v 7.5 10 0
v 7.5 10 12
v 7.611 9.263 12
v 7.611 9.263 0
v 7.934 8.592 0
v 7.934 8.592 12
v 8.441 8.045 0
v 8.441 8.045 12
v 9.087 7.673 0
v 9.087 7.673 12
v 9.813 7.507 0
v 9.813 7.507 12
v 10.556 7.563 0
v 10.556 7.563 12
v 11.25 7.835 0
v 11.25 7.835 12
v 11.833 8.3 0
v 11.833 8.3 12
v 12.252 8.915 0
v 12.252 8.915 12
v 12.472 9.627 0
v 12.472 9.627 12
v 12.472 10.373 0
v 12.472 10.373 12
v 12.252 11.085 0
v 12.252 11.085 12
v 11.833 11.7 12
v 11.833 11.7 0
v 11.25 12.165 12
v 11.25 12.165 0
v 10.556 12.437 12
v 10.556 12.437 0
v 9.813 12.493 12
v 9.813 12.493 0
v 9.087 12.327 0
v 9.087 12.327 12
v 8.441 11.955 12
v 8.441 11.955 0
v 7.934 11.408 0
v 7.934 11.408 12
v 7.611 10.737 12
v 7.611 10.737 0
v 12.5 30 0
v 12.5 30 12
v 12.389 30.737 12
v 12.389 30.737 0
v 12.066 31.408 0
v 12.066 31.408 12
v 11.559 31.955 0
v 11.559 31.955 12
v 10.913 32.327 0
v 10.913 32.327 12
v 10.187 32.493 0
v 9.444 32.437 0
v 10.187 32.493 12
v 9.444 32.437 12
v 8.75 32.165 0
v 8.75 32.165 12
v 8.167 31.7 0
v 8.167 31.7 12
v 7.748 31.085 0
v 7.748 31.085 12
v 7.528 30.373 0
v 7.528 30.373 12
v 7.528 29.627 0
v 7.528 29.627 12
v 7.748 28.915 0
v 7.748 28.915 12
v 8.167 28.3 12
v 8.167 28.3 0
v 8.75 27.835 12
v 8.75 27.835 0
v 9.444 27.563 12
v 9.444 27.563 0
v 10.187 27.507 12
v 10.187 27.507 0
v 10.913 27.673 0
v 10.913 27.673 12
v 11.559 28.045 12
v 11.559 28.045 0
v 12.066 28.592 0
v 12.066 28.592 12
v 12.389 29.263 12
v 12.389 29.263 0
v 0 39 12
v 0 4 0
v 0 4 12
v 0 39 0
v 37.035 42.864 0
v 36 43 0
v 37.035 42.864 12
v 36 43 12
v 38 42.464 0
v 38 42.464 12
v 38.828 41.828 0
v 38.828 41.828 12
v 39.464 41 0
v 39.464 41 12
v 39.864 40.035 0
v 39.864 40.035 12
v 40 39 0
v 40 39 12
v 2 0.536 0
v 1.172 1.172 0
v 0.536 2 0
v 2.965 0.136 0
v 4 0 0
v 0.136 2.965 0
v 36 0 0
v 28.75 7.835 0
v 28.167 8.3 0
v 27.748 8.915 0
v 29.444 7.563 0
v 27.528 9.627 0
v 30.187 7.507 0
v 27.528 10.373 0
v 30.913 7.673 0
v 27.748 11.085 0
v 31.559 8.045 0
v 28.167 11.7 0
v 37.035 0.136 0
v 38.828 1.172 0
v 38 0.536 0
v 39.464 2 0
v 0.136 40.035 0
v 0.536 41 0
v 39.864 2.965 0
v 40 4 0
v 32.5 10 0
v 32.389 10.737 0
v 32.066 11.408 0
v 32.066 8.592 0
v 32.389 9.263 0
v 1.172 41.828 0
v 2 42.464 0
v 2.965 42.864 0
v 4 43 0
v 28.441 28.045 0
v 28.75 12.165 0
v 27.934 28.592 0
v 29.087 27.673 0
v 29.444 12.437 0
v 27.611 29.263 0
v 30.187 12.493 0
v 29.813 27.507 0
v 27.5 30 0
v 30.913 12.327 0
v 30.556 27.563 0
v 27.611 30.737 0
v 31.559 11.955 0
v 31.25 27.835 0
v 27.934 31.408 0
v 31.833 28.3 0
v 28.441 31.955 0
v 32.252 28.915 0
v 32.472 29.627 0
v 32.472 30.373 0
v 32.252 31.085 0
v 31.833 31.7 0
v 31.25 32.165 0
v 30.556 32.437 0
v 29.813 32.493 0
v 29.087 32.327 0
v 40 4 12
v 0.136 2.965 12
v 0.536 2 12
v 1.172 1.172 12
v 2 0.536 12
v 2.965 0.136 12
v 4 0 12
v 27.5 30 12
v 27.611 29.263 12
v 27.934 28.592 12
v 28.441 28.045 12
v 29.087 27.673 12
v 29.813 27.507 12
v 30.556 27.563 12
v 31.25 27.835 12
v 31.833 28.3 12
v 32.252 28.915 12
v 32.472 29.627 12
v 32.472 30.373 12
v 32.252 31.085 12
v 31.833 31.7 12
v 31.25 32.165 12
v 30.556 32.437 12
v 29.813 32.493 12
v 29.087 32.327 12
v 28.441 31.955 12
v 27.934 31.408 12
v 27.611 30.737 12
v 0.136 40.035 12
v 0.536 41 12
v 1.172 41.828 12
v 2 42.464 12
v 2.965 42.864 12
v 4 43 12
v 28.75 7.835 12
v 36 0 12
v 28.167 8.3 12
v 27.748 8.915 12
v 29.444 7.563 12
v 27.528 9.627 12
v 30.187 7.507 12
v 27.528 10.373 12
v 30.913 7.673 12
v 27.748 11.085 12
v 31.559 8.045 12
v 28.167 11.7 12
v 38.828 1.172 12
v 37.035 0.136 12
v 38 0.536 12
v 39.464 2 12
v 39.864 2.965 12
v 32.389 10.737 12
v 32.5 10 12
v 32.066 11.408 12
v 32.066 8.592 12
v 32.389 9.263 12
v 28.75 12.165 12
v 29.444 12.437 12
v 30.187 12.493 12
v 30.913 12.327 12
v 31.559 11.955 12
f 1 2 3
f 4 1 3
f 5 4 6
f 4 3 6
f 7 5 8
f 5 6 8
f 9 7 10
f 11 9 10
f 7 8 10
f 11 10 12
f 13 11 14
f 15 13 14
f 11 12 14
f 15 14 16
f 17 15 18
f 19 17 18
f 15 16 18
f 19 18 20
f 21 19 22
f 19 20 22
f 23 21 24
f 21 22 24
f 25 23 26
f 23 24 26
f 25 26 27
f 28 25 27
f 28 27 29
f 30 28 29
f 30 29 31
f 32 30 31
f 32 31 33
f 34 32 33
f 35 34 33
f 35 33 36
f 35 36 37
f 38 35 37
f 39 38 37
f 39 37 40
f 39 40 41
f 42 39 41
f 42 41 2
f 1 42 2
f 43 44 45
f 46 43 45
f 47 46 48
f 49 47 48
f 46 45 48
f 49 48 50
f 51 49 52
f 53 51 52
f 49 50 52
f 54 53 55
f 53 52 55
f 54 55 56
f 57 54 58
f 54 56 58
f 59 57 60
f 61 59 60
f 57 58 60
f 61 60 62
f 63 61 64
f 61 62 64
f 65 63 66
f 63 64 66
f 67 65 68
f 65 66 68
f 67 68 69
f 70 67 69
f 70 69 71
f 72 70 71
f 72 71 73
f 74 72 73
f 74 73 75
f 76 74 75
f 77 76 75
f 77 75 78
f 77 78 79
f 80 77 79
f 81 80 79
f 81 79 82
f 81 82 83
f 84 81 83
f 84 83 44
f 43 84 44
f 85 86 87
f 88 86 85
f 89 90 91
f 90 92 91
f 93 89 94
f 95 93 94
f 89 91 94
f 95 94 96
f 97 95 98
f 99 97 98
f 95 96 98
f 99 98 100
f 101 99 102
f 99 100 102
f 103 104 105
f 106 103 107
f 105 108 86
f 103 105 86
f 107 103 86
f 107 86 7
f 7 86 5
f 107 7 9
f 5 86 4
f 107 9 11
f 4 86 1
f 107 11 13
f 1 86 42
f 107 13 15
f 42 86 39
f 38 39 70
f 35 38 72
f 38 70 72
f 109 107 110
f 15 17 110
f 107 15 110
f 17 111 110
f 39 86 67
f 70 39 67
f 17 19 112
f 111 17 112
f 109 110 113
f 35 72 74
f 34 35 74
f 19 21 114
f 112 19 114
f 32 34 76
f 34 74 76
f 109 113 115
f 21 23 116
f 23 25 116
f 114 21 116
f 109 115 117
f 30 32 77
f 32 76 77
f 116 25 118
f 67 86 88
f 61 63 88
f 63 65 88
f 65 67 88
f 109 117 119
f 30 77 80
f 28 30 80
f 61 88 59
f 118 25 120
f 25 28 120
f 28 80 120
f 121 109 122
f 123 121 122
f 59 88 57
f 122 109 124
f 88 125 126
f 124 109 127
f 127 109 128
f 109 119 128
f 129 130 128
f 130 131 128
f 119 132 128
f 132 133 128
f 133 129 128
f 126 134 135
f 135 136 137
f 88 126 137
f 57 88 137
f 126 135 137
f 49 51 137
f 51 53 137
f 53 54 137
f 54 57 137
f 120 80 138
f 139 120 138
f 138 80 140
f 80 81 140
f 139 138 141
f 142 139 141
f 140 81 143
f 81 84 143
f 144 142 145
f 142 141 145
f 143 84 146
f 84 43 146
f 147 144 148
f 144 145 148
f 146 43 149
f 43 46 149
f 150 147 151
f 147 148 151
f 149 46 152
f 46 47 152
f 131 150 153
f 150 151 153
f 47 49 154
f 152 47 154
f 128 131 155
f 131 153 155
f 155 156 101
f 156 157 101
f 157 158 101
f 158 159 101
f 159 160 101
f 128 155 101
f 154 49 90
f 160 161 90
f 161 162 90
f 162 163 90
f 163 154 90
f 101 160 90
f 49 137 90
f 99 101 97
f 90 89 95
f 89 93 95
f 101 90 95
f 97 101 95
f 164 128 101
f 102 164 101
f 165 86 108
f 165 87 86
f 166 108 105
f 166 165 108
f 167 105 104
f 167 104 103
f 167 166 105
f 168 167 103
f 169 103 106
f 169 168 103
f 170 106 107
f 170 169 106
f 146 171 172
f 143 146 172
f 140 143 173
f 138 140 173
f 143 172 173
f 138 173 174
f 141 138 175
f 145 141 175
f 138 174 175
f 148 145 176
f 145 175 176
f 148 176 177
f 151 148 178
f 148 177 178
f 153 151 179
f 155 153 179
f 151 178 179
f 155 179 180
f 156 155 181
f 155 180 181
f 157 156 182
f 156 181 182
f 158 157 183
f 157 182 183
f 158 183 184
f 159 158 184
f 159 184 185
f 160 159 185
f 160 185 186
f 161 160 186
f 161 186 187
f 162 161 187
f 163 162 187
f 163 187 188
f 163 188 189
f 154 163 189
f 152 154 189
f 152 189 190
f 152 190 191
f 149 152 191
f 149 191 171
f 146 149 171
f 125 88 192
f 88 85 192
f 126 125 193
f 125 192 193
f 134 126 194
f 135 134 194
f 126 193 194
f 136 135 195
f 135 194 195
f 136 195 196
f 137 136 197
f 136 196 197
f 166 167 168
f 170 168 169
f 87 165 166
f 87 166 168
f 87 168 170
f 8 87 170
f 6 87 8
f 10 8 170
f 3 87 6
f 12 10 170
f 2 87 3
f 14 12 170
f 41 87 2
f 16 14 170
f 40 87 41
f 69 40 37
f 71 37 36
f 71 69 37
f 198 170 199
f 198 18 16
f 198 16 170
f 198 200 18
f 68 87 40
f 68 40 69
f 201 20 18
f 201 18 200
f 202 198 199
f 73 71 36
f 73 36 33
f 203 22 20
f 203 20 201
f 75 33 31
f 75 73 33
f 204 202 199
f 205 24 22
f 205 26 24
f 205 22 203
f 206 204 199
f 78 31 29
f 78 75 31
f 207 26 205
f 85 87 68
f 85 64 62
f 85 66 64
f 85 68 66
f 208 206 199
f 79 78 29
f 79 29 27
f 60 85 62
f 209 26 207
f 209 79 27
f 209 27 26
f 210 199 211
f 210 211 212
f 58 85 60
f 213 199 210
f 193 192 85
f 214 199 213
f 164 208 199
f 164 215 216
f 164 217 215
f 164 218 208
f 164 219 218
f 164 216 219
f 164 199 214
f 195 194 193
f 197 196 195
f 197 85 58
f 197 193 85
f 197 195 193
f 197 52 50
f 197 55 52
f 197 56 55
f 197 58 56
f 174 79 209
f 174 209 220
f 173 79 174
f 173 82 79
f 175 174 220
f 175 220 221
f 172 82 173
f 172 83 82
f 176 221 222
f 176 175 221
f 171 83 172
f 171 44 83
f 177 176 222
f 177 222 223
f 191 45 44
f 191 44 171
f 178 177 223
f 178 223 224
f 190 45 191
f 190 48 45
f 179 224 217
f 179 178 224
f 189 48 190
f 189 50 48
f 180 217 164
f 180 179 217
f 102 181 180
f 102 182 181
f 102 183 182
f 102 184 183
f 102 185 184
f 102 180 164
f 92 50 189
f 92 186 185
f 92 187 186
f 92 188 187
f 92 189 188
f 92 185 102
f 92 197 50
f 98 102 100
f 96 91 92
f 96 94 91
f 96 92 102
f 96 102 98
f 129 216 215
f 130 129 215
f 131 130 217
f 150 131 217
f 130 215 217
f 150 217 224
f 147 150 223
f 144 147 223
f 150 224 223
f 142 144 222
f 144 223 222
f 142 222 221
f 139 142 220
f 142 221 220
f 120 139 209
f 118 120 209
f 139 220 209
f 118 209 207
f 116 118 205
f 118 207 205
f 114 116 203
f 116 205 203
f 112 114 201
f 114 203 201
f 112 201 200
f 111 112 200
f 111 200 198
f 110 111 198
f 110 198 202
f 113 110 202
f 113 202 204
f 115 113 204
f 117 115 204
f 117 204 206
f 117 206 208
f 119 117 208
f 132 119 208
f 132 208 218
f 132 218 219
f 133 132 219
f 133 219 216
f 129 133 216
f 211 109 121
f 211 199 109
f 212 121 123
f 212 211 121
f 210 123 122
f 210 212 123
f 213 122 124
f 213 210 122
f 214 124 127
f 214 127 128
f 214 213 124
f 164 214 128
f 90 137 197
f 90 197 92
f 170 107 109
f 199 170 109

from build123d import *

# Parameters (mm, degrees)
ESQUISSE1_W             = 40
ESQUISSE1_H             = 43
BOSS_EXTRU_1_DEPTH      = 12
ESQUISSE2_R             = 2.5
ENL_V_MAT_EXTRU_1_DEPTH = 60.941638283
CONG_1_R                = 4


with BuildPart() as part:
    # Esquisse1 → Boss.-Extru.1 (new body)
    with BuildSketch(Plane.XY):
        with Locations((20, 21.5)):
            Rectangle(ESQUISSE1_W, ESQUISSE1_H)
    extrude(amount=BOSS_EXTRU_1_DEPTH)

    # Esquisse2 → Enlèv. mat.-Extru.1 (cut, through all)
    with BuildSketch(Plane.XY.offset(12)):
        with Locations((10, 30)):
            Circle(ESQUISSE2_R)
        with Locations(Location((10, 10, 0), (0, 0, 180))):
            Circle(ESQUISSE2_R)
        with Locations((30, 10)):
            Circle(ESQUISSE2_R)
        with Locations(Location((30, 30, 0), (0, 0, 180))):
            Circle(ESQUISSE2_R)
    extrude(amount=-ENL_V_MAT_EXTRU_1_DEPTH, mode=Mode.SUBTRACT)

    # Congé1
    cong_1_edges = [part.edges().sort_by_distance(p)[0] for p in [
        (0, 43, 6),
        (40, 43, 6),
        (40, 0, 6),
        (0, 0, 6),
    ]]
    fillet(cong_1_edges, radius=CONG_1_R)


solid = part.part
